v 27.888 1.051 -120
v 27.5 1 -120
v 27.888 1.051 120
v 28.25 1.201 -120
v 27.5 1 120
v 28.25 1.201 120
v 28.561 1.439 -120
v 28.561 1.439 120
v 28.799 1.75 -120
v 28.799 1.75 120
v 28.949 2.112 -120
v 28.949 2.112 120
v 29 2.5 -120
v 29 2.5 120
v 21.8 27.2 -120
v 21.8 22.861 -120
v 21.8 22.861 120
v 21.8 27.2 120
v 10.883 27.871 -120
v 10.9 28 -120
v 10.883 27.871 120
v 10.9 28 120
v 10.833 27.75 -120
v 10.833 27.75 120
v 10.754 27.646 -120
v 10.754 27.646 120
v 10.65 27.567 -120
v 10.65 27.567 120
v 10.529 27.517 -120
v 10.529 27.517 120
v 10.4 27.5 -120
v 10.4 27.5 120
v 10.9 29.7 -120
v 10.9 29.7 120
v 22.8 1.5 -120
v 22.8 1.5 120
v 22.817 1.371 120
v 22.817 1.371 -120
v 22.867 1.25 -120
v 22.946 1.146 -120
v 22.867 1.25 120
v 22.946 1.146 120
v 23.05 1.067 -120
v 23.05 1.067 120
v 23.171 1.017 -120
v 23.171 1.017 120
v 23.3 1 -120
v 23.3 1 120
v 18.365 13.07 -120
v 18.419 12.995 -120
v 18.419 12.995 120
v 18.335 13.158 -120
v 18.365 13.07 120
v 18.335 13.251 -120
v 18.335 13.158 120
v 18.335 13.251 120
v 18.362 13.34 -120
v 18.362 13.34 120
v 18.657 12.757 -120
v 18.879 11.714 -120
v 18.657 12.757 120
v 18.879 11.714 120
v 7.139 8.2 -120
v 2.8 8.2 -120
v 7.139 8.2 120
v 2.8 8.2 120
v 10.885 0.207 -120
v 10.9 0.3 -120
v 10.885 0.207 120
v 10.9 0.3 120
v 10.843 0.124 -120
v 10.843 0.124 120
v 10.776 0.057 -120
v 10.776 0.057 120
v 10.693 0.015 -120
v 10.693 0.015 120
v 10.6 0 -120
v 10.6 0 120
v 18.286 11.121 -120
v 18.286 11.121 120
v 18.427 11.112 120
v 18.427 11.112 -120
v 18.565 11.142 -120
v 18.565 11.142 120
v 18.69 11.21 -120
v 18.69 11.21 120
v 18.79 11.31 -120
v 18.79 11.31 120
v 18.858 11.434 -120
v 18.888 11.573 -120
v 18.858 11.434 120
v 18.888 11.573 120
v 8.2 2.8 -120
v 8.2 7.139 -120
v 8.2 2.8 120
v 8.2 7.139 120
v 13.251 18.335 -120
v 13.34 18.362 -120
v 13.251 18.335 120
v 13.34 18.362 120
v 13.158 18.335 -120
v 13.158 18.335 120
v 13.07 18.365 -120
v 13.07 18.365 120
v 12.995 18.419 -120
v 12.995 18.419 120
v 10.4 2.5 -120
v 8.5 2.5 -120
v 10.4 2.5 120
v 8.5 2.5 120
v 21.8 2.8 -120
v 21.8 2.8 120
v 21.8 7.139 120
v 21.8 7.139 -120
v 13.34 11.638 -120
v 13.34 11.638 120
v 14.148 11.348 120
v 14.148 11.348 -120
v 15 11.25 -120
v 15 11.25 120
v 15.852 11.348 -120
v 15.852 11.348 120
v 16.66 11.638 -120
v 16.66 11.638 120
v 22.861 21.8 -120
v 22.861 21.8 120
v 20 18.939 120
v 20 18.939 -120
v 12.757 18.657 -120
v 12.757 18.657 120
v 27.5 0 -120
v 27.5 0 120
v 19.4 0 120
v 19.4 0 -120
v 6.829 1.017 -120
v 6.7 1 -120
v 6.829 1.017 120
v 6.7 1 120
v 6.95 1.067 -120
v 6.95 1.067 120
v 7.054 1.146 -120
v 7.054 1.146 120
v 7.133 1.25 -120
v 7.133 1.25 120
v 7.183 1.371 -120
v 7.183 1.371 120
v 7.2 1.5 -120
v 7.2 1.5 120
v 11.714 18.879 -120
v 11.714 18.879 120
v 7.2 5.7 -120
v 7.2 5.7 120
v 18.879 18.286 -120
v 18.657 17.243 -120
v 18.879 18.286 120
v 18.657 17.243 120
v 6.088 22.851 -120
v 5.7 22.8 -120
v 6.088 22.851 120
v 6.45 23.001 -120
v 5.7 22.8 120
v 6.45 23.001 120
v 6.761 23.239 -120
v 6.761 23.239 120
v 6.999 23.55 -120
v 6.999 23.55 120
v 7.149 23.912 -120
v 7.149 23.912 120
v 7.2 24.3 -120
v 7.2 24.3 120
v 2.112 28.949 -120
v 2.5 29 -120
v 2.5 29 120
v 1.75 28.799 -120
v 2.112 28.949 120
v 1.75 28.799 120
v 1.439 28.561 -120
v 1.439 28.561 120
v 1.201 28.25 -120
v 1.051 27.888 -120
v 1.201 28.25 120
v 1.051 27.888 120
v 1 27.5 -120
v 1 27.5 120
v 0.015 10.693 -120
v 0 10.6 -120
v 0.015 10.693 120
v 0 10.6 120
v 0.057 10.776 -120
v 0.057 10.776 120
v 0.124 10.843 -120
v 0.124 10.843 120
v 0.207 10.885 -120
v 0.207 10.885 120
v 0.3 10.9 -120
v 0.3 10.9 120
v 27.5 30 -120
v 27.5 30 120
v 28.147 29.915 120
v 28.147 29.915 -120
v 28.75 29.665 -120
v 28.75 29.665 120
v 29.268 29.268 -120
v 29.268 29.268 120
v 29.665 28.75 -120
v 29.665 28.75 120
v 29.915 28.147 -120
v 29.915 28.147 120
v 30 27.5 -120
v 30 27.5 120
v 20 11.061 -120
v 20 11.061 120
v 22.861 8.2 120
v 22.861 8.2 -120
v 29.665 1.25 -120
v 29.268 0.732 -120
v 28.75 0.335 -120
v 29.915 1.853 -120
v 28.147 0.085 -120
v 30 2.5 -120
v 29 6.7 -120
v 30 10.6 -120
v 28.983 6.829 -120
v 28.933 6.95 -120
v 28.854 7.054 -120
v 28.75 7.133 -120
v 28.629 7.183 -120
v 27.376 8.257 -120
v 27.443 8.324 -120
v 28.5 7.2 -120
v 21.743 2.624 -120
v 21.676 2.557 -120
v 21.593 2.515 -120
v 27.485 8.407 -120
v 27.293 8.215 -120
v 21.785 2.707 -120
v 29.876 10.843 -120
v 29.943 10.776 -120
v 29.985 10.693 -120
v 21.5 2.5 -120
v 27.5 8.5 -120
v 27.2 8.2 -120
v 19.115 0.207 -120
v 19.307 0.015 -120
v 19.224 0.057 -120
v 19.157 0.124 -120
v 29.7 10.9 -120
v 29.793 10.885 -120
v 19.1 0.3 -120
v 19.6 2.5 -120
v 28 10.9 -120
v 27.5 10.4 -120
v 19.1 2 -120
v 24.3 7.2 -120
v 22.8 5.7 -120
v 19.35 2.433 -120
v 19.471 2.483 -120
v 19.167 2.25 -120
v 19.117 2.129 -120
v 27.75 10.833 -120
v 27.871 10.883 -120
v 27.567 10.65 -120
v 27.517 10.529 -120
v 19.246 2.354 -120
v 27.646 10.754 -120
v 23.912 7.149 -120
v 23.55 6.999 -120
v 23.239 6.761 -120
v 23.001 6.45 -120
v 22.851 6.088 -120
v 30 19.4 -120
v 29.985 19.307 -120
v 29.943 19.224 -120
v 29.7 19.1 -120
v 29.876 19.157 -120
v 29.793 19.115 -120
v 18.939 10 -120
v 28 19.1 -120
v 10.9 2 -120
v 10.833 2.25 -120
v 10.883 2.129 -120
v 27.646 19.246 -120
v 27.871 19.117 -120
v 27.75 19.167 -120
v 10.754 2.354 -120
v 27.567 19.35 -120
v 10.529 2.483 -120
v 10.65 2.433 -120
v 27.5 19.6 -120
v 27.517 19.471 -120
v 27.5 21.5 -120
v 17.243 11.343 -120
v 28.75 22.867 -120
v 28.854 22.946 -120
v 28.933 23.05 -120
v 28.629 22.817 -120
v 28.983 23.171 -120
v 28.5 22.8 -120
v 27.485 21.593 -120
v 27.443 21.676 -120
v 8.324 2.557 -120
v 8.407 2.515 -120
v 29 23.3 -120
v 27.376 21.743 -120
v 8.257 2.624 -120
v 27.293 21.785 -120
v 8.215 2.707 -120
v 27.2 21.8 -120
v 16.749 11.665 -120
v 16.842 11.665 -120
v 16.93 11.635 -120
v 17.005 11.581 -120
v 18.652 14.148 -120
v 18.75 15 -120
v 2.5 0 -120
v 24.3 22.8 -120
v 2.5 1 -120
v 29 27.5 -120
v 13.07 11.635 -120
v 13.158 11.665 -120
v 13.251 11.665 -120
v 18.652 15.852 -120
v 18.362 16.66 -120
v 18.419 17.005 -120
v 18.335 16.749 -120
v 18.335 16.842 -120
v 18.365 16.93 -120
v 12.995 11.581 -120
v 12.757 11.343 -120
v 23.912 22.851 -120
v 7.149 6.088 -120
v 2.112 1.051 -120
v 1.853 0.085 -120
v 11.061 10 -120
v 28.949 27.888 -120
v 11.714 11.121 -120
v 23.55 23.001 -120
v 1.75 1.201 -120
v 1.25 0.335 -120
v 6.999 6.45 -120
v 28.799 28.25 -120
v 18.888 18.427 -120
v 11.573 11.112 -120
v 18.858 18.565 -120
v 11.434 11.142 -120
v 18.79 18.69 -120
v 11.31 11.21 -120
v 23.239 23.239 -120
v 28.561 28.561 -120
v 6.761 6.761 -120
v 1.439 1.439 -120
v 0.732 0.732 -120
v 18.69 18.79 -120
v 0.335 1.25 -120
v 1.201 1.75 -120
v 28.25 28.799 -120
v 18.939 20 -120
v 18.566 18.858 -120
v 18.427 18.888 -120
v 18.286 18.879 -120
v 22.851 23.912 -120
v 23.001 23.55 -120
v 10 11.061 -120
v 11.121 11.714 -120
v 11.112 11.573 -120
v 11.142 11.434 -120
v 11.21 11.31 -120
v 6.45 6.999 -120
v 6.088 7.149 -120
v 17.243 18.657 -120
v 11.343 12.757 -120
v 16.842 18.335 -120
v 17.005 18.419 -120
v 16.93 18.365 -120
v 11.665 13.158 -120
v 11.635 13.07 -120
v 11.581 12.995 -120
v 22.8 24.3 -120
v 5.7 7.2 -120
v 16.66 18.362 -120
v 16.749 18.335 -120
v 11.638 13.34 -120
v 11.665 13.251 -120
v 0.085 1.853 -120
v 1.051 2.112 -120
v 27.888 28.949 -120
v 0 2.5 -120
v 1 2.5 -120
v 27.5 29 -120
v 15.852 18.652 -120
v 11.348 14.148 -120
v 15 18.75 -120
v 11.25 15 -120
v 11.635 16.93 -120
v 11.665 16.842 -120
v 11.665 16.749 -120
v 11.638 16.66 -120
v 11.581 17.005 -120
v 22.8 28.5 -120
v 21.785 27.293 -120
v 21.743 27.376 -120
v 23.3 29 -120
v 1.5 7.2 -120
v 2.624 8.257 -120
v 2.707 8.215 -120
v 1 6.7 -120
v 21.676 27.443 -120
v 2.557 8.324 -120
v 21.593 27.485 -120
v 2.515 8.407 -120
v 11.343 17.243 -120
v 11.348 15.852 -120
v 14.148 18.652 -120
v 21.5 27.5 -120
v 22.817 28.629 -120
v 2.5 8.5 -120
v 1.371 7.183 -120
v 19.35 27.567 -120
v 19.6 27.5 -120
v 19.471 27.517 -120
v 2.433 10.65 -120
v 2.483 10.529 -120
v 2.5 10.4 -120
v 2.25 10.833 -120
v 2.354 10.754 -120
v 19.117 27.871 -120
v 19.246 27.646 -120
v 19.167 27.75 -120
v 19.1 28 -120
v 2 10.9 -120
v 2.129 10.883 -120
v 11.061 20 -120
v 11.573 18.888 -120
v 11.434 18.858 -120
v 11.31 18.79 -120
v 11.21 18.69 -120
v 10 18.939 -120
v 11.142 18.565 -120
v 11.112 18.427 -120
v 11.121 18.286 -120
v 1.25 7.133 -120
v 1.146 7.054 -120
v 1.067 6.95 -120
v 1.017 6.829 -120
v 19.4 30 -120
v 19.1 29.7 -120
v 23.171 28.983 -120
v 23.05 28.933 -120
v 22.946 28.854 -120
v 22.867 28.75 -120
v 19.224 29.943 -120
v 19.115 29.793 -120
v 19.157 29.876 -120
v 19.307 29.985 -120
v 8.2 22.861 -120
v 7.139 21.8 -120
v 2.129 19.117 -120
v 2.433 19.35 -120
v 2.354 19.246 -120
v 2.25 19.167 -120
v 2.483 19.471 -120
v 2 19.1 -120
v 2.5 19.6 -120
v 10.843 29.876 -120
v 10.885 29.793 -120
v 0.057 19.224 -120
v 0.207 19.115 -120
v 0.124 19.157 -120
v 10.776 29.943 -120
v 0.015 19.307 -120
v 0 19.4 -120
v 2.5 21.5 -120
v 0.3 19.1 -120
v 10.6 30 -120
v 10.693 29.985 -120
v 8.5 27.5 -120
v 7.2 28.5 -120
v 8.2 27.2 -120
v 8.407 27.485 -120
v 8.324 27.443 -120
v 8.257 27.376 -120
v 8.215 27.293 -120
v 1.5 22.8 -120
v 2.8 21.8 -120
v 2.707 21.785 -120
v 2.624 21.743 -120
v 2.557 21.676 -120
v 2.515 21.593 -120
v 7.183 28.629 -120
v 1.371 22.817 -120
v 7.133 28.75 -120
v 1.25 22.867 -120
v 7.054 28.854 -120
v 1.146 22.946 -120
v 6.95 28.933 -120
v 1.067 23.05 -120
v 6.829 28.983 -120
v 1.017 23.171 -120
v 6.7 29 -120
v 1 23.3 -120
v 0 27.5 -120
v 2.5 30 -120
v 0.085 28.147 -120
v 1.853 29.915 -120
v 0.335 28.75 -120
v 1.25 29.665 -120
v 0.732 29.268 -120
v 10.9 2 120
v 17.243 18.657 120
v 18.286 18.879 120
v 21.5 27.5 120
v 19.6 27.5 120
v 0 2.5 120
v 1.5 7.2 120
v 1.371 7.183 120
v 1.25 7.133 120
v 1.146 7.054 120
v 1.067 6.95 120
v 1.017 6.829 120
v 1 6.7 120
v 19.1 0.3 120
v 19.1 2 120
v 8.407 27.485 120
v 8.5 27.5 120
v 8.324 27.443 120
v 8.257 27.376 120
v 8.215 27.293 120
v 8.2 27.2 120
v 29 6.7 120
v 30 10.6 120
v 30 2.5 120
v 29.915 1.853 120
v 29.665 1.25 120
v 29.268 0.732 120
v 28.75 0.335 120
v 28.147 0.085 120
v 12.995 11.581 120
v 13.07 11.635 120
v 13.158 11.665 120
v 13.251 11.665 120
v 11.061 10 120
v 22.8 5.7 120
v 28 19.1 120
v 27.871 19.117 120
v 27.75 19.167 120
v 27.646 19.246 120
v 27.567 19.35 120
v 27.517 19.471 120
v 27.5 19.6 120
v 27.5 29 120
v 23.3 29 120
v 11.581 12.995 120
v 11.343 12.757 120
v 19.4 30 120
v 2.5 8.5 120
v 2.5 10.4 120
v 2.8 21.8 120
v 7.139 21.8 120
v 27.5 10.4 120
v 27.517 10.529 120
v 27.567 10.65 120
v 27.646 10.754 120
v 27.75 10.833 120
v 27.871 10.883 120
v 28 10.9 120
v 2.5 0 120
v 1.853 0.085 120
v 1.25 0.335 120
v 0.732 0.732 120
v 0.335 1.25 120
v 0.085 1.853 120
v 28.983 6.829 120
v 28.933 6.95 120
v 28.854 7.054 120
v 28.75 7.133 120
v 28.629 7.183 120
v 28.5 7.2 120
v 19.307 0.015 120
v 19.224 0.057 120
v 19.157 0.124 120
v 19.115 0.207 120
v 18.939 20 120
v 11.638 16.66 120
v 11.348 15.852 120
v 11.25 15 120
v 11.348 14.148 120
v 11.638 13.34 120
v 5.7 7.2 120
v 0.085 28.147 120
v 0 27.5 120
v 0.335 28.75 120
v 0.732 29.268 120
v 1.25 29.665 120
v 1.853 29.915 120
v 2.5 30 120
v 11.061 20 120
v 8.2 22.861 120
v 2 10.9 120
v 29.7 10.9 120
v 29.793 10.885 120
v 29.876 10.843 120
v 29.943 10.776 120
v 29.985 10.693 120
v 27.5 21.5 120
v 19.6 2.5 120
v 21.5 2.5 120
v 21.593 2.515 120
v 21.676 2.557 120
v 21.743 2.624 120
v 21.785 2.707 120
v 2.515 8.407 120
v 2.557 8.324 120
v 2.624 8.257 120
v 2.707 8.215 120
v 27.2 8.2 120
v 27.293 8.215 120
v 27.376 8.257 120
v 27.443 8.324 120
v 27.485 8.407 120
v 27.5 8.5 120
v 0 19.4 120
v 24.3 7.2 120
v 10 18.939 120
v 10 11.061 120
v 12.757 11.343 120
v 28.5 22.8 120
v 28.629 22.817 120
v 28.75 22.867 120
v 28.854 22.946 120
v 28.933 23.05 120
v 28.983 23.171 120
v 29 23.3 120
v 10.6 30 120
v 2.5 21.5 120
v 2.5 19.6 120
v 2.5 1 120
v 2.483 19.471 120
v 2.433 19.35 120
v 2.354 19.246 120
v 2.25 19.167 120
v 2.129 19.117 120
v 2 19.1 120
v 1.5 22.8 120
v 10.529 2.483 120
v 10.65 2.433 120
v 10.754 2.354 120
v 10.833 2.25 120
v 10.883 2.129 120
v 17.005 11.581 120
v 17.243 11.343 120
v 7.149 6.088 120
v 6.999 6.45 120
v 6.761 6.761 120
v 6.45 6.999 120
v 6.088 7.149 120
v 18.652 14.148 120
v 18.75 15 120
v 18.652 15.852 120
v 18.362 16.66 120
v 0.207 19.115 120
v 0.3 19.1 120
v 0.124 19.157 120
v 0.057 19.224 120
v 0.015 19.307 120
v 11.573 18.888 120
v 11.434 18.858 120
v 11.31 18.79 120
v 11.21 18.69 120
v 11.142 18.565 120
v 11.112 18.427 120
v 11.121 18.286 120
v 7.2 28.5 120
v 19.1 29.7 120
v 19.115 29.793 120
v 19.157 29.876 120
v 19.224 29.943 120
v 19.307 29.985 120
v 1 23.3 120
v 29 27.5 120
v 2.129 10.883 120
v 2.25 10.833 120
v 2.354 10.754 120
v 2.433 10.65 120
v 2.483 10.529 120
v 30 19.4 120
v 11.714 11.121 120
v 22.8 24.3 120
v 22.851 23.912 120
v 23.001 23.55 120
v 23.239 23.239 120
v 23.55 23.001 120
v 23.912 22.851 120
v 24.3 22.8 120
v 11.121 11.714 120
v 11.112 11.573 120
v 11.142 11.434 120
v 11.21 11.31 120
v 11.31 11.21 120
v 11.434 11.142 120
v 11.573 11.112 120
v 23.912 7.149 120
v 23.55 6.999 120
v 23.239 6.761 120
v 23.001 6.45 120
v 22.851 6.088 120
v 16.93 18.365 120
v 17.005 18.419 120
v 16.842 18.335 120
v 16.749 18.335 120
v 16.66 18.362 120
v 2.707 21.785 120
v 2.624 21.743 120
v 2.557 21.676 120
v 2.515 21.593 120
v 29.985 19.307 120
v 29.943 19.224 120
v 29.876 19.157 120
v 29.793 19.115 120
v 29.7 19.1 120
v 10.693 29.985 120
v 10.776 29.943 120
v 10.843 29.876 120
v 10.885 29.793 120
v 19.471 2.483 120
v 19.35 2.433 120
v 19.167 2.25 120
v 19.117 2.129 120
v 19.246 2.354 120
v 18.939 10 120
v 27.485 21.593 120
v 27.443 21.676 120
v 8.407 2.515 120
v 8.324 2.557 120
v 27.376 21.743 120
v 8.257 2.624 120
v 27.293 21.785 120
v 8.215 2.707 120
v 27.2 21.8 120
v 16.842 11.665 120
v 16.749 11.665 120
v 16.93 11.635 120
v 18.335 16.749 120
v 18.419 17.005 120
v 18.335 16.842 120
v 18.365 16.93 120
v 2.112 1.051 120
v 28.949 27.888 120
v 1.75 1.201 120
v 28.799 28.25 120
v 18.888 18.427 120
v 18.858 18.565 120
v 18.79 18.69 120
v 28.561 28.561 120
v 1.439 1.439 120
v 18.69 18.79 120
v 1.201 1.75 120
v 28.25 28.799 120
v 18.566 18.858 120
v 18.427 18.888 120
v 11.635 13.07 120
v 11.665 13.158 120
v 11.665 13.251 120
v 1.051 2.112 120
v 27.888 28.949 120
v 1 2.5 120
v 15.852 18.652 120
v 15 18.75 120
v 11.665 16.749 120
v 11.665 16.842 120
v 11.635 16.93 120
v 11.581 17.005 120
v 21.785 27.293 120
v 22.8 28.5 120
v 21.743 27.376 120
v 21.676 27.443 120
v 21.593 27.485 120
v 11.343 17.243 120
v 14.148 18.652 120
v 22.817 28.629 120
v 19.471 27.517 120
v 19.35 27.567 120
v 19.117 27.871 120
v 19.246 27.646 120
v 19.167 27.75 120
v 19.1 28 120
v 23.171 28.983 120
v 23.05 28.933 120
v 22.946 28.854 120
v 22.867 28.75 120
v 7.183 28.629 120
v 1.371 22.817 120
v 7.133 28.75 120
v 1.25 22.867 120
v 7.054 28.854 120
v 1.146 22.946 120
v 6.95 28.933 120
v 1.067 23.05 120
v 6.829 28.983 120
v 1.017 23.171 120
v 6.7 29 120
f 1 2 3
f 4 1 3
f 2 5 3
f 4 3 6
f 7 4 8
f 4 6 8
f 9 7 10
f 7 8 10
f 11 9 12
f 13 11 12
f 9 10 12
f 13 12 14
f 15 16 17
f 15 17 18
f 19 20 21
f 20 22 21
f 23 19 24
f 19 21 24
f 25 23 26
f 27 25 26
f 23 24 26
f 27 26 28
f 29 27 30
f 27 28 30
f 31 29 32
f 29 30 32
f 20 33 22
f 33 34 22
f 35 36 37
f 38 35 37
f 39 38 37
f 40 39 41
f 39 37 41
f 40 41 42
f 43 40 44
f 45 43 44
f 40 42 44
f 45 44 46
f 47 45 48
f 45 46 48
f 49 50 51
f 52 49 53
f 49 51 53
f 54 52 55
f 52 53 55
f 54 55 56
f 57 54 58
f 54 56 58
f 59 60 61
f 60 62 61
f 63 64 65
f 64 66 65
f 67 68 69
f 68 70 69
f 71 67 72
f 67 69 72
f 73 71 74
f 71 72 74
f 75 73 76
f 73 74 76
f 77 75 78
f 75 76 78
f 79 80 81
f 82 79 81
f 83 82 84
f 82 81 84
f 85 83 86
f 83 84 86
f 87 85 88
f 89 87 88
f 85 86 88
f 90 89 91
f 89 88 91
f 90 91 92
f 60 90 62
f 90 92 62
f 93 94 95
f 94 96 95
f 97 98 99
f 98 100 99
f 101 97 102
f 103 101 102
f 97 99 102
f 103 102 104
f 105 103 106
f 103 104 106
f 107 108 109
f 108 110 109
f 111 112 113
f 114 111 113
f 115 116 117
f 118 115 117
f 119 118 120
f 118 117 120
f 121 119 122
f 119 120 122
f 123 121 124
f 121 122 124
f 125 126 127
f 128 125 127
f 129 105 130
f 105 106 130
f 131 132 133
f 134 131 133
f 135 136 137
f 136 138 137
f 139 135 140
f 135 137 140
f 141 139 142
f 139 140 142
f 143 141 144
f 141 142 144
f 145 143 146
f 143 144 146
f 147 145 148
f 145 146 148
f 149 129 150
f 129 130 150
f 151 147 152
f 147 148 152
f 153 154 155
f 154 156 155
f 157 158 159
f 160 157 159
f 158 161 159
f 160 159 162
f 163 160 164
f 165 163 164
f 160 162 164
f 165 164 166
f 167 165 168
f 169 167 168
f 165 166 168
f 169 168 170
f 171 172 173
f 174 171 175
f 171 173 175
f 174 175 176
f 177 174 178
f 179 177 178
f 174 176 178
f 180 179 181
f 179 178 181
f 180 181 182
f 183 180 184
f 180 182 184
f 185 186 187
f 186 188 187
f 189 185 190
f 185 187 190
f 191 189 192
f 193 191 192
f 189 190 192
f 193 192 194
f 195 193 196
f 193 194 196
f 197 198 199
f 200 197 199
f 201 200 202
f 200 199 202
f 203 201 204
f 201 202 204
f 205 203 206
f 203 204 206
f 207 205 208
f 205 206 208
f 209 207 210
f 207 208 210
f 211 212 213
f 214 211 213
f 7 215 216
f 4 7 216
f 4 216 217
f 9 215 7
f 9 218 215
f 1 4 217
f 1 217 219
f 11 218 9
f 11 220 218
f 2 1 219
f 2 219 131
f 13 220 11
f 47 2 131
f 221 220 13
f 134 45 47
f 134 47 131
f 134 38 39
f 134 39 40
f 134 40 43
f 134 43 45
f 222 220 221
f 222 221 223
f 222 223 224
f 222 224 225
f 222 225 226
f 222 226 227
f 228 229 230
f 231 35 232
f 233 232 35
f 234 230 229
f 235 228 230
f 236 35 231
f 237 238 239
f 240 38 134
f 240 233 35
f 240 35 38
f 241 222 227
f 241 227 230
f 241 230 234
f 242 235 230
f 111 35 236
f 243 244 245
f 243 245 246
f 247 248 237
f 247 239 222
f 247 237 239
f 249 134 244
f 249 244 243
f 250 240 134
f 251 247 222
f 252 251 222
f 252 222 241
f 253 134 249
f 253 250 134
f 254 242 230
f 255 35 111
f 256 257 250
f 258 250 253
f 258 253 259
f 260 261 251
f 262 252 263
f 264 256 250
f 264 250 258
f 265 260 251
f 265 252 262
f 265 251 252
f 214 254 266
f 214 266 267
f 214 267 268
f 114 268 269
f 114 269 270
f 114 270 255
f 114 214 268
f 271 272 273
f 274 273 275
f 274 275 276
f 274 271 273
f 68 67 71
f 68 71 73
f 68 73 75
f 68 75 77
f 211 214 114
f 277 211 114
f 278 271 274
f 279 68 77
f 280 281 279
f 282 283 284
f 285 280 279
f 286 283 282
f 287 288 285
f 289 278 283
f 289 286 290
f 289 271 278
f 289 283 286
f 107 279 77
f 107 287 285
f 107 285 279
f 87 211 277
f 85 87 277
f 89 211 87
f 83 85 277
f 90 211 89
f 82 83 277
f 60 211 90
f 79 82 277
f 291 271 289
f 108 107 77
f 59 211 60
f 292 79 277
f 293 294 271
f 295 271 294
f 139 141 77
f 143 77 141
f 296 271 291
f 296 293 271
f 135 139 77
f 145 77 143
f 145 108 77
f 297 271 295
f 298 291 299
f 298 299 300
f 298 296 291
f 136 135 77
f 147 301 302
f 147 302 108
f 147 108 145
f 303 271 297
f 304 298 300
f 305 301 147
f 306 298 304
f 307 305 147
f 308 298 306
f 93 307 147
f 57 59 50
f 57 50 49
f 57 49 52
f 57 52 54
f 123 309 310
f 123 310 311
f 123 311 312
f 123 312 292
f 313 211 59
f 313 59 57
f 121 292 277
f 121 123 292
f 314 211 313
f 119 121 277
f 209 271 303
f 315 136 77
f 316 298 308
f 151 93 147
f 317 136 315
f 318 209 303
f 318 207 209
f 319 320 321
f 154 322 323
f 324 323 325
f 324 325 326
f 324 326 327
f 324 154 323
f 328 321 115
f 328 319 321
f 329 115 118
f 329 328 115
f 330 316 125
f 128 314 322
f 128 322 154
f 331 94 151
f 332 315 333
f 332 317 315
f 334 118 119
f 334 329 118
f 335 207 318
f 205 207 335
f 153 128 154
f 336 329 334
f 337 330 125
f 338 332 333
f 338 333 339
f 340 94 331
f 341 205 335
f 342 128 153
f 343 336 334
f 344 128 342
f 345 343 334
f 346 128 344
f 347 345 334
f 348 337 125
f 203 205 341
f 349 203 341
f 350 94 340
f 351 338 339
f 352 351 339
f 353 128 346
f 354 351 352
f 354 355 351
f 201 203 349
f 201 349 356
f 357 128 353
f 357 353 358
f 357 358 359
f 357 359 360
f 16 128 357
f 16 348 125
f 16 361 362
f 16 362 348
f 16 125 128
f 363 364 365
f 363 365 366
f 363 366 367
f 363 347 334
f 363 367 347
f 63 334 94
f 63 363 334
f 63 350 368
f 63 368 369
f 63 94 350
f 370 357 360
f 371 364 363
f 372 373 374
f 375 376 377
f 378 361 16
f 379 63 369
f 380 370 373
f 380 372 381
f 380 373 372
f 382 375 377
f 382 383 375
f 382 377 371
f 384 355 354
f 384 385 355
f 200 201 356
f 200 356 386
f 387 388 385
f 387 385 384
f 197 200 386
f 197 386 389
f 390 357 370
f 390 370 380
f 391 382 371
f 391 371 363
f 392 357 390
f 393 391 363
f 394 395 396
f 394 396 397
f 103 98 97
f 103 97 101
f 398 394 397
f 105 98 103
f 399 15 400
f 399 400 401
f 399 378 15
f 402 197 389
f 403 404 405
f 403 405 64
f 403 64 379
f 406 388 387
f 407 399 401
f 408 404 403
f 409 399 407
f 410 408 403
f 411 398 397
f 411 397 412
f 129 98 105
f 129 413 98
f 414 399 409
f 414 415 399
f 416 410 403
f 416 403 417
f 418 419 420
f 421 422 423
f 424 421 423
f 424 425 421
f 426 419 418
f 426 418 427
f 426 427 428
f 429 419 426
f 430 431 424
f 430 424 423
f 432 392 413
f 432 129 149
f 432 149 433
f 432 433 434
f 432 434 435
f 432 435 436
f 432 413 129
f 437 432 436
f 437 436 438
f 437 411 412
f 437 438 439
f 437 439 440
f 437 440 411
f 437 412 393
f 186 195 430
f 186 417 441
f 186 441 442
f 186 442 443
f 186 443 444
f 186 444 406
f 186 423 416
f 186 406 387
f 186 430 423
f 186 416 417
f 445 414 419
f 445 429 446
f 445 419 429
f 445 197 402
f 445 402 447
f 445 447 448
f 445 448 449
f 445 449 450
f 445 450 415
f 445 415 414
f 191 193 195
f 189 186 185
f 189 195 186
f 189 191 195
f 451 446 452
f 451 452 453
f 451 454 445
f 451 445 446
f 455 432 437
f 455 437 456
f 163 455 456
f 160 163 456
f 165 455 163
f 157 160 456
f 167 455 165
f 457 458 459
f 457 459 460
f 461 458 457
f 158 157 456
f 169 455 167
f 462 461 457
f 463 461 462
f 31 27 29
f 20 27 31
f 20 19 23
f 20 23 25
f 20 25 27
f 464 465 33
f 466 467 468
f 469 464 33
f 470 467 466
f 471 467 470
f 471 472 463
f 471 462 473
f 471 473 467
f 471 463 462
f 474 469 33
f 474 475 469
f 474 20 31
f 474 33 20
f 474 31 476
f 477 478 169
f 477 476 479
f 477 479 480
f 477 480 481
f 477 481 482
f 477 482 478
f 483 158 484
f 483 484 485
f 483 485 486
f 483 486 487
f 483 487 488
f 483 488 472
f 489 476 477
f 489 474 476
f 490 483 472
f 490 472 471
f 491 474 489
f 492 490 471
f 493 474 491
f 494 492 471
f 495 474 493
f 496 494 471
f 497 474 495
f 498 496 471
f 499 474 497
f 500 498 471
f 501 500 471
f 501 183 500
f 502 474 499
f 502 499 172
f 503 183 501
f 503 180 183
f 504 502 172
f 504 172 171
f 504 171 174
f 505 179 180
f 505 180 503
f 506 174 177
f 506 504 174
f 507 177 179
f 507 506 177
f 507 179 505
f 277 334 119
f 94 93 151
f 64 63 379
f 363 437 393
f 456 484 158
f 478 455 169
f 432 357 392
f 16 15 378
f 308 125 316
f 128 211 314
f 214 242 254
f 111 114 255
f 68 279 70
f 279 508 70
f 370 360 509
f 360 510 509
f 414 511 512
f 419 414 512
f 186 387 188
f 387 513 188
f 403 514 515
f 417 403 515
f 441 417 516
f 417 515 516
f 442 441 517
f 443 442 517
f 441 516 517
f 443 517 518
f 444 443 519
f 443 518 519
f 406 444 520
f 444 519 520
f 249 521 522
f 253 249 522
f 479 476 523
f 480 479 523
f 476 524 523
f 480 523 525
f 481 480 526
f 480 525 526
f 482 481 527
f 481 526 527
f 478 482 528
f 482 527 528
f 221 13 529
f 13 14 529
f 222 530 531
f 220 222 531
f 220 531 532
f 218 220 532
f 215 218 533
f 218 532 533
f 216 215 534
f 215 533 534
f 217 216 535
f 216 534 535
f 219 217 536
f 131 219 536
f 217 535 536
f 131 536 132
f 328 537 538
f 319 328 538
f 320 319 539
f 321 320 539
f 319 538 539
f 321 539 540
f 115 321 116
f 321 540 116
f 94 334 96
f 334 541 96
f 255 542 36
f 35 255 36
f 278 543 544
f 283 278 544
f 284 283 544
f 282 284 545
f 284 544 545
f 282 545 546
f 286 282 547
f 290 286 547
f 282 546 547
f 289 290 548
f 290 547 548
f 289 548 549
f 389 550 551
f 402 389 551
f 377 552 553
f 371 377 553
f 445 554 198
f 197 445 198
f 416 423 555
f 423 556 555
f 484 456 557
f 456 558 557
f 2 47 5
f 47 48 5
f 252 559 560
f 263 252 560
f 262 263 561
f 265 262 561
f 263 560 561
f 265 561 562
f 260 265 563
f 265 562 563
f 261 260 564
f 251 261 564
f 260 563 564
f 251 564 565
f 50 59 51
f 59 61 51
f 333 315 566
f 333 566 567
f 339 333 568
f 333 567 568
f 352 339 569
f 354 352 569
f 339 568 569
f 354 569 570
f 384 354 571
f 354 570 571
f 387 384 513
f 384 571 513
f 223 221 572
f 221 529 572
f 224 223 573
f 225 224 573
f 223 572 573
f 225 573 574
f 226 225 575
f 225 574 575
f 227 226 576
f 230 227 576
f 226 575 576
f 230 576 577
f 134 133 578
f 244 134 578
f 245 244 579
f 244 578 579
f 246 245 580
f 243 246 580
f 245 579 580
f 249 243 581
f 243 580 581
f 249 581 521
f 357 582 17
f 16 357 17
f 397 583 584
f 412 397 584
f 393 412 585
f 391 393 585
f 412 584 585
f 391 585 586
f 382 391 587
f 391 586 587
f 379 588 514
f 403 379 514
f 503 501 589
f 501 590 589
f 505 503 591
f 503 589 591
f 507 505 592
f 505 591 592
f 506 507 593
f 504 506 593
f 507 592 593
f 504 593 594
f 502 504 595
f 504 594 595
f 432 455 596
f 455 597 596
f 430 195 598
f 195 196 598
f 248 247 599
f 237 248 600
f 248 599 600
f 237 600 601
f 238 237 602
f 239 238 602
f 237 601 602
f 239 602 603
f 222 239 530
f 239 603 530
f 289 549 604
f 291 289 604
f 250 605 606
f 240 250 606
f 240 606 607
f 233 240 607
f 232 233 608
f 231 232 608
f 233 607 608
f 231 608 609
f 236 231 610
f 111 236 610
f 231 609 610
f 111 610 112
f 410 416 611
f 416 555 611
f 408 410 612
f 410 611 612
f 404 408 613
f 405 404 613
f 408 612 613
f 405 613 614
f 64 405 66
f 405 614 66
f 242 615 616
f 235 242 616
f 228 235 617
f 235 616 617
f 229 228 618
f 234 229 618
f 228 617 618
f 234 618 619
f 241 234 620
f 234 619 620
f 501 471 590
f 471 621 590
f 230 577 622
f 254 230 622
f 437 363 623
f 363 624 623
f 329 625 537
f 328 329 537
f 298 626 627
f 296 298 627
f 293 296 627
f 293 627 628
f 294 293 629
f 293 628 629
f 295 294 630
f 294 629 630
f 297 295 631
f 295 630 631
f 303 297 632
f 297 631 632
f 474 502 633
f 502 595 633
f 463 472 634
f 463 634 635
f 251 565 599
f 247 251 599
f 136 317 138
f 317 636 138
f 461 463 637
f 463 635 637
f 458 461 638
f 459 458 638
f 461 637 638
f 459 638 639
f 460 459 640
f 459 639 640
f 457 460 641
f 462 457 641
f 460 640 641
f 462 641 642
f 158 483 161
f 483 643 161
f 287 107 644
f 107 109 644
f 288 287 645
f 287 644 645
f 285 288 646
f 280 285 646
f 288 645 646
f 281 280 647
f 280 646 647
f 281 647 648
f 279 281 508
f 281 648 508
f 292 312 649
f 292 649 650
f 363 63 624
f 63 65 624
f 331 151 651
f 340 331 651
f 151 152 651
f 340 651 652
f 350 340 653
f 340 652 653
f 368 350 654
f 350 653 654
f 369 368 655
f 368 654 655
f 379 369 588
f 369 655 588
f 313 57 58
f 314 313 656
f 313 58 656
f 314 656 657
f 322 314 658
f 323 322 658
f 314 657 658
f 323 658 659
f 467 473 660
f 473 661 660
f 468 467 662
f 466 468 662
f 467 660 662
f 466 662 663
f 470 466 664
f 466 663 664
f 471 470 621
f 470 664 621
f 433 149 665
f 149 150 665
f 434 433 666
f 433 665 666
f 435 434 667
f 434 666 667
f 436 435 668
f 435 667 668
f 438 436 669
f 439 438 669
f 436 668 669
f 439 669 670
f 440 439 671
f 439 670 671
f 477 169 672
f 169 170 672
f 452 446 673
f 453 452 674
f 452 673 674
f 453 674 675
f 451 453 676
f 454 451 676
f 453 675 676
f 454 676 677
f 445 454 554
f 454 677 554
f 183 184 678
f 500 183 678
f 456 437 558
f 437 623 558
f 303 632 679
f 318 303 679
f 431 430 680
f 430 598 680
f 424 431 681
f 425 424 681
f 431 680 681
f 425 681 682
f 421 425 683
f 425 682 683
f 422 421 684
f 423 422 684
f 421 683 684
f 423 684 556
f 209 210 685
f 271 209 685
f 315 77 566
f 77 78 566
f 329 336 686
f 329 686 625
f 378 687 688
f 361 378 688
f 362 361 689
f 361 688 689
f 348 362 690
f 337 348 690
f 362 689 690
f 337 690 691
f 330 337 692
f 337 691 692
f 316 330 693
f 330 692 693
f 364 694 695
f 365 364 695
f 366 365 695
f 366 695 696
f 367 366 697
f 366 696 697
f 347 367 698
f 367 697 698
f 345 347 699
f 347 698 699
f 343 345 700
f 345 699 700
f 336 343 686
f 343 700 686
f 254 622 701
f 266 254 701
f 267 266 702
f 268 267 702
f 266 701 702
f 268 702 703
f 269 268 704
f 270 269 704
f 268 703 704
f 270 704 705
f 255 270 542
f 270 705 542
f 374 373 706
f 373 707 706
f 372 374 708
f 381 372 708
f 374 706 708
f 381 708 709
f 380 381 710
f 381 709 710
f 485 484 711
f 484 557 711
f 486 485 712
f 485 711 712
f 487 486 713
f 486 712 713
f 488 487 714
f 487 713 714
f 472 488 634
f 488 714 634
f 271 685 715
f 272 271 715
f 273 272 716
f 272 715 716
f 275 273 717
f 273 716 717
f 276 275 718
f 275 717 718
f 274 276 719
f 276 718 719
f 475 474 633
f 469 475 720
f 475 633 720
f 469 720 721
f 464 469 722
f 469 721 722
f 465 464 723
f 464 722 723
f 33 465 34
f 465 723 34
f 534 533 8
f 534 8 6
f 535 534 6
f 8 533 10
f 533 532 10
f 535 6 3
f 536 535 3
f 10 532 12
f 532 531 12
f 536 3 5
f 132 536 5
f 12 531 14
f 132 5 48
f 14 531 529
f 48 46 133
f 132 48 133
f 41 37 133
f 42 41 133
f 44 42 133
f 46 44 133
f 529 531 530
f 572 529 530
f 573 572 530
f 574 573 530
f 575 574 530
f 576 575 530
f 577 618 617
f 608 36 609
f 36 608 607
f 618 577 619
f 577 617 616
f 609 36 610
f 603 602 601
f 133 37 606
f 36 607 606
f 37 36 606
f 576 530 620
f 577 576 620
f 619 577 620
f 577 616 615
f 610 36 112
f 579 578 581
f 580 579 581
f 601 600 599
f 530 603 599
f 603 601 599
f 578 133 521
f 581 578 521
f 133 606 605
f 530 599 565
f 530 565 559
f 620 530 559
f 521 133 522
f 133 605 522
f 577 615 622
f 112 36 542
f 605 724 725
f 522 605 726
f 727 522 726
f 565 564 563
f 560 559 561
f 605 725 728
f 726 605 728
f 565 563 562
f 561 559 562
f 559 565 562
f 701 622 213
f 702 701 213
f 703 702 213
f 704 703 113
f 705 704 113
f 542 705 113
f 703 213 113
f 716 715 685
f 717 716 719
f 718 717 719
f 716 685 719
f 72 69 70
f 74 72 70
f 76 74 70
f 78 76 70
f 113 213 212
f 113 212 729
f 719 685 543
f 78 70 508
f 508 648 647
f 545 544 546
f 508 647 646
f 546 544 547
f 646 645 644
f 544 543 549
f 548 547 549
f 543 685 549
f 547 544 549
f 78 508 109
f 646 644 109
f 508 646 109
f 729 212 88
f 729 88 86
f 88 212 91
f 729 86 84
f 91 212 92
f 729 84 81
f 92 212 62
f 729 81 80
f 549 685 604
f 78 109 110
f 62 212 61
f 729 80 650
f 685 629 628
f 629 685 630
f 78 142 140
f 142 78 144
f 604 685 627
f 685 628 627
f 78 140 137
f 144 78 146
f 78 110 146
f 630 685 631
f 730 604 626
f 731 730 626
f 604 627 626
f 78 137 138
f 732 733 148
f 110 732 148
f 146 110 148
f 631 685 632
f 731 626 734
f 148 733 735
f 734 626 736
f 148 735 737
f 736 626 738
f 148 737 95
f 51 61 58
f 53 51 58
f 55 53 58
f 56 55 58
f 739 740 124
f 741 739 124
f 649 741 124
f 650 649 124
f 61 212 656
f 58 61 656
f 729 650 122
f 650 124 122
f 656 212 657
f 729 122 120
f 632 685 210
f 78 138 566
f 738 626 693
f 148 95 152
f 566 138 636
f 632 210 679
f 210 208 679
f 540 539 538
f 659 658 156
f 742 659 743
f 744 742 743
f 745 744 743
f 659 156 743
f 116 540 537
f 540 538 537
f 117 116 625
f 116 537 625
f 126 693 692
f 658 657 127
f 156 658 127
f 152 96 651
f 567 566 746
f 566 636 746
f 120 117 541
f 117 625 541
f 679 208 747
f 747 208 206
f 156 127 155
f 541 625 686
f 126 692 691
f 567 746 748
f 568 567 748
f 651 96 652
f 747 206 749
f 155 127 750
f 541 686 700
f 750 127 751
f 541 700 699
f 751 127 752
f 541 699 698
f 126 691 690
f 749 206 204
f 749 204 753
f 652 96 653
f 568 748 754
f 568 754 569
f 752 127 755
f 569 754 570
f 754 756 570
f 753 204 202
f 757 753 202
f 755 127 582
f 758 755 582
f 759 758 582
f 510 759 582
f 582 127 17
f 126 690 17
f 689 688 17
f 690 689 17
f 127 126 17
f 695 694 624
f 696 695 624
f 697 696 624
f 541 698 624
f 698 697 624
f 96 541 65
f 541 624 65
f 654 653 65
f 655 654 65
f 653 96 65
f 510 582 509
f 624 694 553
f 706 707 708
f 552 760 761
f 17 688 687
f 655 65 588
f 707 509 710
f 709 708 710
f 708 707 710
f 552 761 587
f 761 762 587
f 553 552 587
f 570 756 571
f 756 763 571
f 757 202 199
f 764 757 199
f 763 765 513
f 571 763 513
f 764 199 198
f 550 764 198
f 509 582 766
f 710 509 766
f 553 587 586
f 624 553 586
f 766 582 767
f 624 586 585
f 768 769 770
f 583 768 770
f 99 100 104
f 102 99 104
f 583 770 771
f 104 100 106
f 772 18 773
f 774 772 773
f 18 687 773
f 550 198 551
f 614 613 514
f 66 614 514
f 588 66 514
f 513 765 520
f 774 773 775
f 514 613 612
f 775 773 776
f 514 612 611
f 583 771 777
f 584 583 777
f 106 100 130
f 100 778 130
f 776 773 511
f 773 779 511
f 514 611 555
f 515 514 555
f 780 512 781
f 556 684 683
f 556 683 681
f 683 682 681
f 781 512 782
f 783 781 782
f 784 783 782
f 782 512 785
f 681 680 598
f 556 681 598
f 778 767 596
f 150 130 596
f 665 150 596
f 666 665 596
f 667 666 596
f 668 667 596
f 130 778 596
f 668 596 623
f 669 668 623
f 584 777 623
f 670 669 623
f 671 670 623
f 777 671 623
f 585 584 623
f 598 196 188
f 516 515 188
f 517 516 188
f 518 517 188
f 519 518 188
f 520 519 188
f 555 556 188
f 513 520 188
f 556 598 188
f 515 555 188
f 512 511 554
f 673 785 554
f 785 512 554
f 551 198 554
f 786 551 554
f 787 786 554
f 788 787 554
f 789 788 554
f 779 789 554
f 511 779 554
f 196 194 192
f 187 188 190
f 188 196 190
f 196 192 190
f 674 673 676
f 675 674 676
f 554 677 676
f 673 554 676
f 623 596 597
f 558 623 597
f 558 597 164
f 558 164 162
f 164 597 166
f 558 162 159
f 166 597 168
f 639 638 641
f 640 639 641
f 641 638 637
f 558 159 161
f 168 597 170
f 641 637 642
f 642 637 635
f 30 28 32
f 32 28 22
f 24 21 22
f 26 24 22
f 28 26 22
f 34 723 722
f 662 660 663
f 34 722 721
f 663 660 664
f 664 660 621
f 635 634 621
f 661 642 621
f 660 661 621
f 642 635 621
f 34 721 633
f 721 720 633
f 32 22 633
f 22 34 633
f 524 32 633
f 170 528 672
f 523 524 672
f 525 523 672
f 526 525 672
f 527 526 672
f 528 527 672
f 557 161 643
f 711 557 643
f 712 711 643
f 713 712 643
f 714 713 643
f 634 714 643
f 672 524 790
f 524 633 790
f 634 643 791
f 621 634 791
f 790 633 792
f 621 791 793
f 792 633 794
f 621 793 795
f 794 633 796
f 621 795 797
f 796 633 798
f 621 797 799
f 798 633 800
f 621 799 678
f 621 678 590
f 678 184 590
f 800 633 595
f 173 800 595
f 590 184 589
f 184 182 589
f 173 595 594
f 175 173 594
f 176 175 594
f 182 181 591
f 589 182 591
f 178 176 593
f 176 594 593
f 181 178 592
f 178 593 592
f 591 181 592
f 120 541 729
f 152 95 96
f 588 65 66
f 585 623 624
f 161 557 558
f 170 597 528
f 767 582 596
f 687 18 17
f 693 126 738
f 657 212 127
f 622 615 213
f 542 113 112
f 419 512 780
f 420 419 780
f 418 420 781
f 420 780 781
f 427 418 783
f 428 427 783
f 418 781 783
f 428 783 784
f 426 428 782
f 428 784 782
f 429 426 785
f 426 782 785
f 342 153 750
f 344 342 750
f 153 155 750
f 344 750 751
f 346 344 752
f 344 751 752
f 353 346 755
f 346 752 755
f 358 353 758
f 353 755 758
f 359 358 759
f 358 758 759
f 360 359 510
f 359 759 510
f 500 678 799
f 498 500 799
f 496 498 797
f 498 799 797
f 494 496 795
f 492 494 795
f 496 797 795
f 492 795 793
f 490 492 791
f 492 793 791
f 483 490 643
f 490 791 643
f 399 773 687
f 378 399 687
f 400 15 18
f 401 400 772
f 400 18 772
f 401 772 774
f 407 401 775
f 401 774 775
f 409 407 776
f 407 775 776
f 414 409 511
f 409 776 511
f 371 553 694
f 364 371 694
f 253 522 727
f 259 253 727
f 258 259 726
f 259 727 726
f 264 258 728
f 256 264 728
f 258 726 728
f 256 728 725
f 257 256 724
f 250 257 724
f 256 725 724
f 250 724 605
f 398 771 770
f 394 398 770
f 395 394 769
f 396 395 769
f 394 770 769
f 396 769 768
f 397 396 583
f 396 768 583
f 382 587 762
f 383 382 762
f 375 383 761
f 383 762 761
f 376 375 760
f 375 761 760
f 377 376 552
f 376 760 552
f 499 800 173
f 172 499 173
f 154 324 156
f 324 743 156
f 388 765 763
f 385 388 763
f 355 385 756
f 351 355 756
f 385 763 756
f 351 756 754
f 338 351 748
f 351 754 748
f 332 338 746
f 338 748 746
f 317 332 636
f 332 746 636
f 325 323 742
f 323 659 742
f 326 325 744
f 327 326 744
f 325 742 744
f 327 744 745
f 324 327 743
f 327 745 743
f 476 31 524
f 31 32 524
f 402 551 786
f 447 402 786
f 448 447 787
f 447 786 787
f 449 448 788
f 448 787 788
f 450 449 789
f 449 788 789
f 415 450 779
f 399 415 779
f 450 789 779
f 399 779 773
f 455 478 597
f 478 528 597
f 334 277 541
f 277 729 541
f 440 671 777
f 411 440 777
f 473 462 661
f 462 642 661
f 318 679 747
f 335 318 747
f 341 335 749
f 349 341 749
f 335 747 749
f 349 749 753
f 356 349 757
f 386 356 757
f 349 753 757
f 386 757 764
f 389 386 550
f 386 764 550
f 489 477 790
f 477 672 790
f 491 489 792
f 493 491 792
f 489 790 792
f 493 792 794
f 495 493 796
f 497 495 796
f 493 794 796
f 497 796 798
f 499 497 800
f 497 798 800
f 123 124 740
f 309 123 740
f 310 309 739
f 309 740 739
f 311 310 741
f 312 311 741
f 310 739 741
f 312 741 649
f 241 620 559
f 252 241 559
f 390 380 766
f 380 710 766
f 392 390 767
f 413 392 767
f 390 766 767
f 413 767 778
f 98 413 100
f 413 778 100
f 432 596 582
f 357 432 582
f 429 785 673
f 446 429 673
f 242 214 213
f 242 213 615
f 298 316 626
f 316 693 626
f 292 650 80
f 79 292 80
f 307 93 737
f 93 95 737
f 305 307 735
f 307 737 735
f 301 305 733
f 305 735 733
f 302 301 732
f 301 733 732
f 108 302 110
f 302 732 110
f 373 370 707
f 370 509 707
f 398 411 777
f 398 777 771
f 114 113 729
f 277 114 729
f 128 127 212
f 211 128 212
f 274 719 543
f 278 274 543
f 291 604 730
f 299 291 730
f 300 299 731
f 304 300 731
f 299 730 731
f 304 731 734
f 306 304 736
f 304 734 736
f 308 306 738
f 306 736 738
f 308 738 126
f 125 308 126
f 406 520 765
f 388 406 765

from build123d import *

# Parameters (mm, degrees)
BOSS_EXTRUDE1_DEPTH = 120


with BuildPart() as part:
    # Sketch1 → Boss-Extrude1 (new body, symmetric)
    with BuildSketch(Plane.XY):
        with BuildLine():
            Line((21.799994, 7.139358412), (18.939339529, 9.999998412))
            Line((18.939339529, 9.999998412), (11.060658529, 9.999998412))
            Line((11.060658529, 9.999998412), (8.200003529, 7.139342412))
            Line((8.200003529, 7.139342412), (8.200003529, 2.800001412))
            ThreePointArc((8.200003529, 2.800001412), (8.287868495, 2.58786762), (8.500000529, 2.499998412))
            Line((8.500000529, 2.499998412), (10.400000529, 2.499998412))
            ThreePointArc((10.400000529, 2.499998412), (10.75355392, 2.353551802), (10.900000529, 1.999998412))
            Line((10.900000529, 1.999998412), (10.900000529, 0.299995529))
            ThreePointArc((10.900000529, 0.299995529), (10.812133796, 0.08786744), (10.600006, 0))
            Line((10.600006, 0), (2.5, 0))
            ThreePointArc((2.5, 0), (0.732233047, 0.732233047), (0, 2.5))
            Line((0, 2.5), (0, 10.600006))
            ThreePointArc((0, 10.600006), (0.087869562, 10.812137388), (0.300003, 10.900002))
            Line((0.300003, 10.900002), (2, 10.900002))
            ThreePointArc((2, 10.900002), (2.353553391, 10.753555391), (2.5, 10.400002))
            Line((2.5, 10.400002), (2.5, 8.500002))
            ThreePointArc((2.5, 8.500002), (2.587869099, 8.287870075), (2.80000269, 8.200005))
            Line((2.80000269, 8.200005), (7.139344, 8.200005))
            Line((7.139344, 8.200005), (10, 11.06066))
            Line((10, 11.06066), (10, 18.939341))
            Line((10, 18.939341), (7.139344, 21.799985148))
            Line((7.139344, 21.799985148), (2.800003, 21.799985148))
            ThreePointArc((2.800003, 21.799985148), (2.587872691, 21.712123666), (2.5, 21.499998))
            Line((2.5, 21.499998), (2.5, 19.599988398))
            ThreePointArc((2.5, 19.599988398), (2.353553317, 19.246434831), (1.99999975, 19.099988148))
            Line((1.99999975, 19.099988148), (0.299996735, 19.099988148))
            ThreePointArc((0.299996735, 19.099988148), (0.0878677, 19.187854622), (0, 19.399983148))
            Line((0, 19.399983148), (0, 27.499989148))
            ThreePointArc((0, 27.499989148), (0.732232787, 29.267756841), (2.500000265, 29.999990148))
            Line((2.500000265, 29.999990148), (10.6000062, 29.999990148))
            ThreePointArc((10.6000062, 29.999990148), (10.812133482, 29.912123021), (10.900000529, 29.699995706))
            Line((10.900000529, 29.699995706), (10.900000529, 27.999998706))
            ThreePointArc((10.900000529, 27.999998706), (10.753556384, 27.64644081), (10.400000529, 27.499991736))
            Line((10.400000529, 27.499991736), (8.499998529, 27.499991736))
            ThreePointArc((8.499998529, 27.499991736), (8.287867897, 27.41212193), (8.200003529, 27.199989046))
            Line((8.200003529, 27.199989046), (8.200003529, 22.860646736))
            Line((8.200003529, 22.860646736), (11.060659, 19.999991736))
            Line((11.060659, 19.999991736), (18.93934, 19.999991736))
            Line((18.93934, 19.999991736), (21.799994, 22.860646736))
            Line((21.799994, 22.860646736), (21.799994, 27.199988736))
            ThreePointArc((21.799994, 27.199988736), (21.712128868, 27.412122694), (21.499996529, 27.499991736))
            Line((21.499996529, 27.499991736), (19.599998, 27.499991736))
            ThreePointArc((19.599998, 27.499991736), (19.246444609, 27.646438346), (19.099998, 27.999991736))
            Line((19.099998, 27.999991736), (19.099998, 29.700007823))
            ThreePointArc((19.099998, 29.700007823), (19.187864526, 29.912137383), (19.3999935, 30.000005323))
            Line((19.3999935, 30.000005323), (27.4999995, 30.000005323))
            ThreePointArc((27.4999995, 30.000005323), (29.267773609, 29.267772326), (30.000009773, 27.499999529))
            Line((30.000009773, 27.499999529), (30.000009773, 19.399993594))
            ThreePointArc((30.000009773, 19.399993594), (29.912139919, 19.187852468), (29.6999965, 19.099988148))
            Line((29.6999965, 19.099988148), (27.9999995, 19.099988148))
            ThreePointArc((27.9999995, 19.099988148), (27.64645275, 19.246438389), (27.500009772, 19.599988147))
            Line((27.500009772, 19.599988147), (27.500009772, 21.499990147))
            ThreePointArc((27.500009772, 21.499990147), (27.412139967, 21.712120779), (27.200007083, 21.799985148))
            Line((27.200007083, 21.799985148), (22.860664773, 21.799985148))
            Line((22.860664773, 21.799985148), (20.000009773, 18.939341))
            Line((20.000009773, 18.939341), (20.000009773, 11.06066))
            Line((20.000009773, 11.06066), (22.8606545, 8.200005))
            Line((22.8606545, 8.200005), (27.1999965, 8.200005))
            ThreePointArc((27.1999965, 8.200005), (27.412129602, 8.287869277), (27.499999499, 8.500000052))
            Line((27.499999499, 8.500000052), (27.499999499, 10.400002001))
            ThreePointArc((27.499999499, 10.400002001), (27.646446109, 10.753555391), (27.9999995, 10.900002))
            Line((27.9999995, 10.900002), (29.7000025, 10.900002))
            ThreePointArc((29.7000025, 10.900002), (29.912138814, 10.812138492), (30.000009773, 10.600005265))
            Line((30.000009773, 10.600005265), (30.000009773, 2.499999265))
            ThreePointArc((30.000009773, 2.499999265), (29.267773942, 0.732224081), (27.500000177, -1.5175e-05))
            Line((27.500000177, -1.5175e-05), (19.399994245, -1.5175e-05))
            ThreePointArc((19.399994245, -1.5175e-05), (19.187855627, 0.08786137), (19.099998, 0.300007824))
            Line((19.099998, 0.300007824), (19.099998, 2.000004824))
            ThreePointArc((19.099998, 2.000004824), (19.246446356, 2.353553549), (19.599996529, 2.499998412))
            Line((19.599996529, 2.499998412), (21.499998529, 2.499998412))
            ThreePointArc((21.499998529, 2.499998412), (21.712135123, 2.587873708), (21.799994, 2.800017102))
            Line((21.799994, 2.800017102), (21.799994, 7.139358412))
        make_face()
        with BuildLine():
            Line((18.878868942, 11.714100014), (18.657285002, 12.75690673))
            Line((18.657285002, 12.75690673), (18.419345869, 12.994846743))
            ThreePointArc((18.419345869, 12.994846743), (18.335473622, 13.158180995), (18.362480424, 13.339793948))
            ThreePointArc((18.362480424, 13.339793948), (18.750006156, 14.99998656), (18.362487962, 16.660180933))
            ThreePointArc((18.362487962, 16.660180933), (18.335481889, 16.841794157), (18.419354758, 17.005128271))
            Line((18.419354758, 17.005128271), (18.657294593, 17.243067582))
            Line((18.657294593, 17.243067582), (18.878893628, 18.28587109))
            ThreePointArc((18.878893628, 18.28587109), (18.743367928, 18.743355263), (18.285883756, 18.878880962))
            Line((18.285883756, 18.878880962), (17.243080247, 18.657281928))
            Line((17.243080247, 18.657281928), (17.005140412, 18.419342617))
            ThreePointArc((17.005140412, 18.419342617), (16.84180664, 18.335470316), (16.660194009, 18.362476539))
            ThreePointArc((16.660194009, 18.362476539), (15.00000526, 18.749996344), (13.339816433, 18.362476869))
            ThreePointArc((13.339816433, 18.362476869), (13.158203164, 18.335470716), (12.994869031, 18.419343671))
            Line((12.994869031, 18.419343671), (12.756929898, 18.657283684))
            Line((12.756929898, 18.657283684), (11.714126233, 18.878881984))
            ThreePointArc((11.714126233, 18.878881984), (11.256641967, 18.743355772), (11.121116891, 18.28587117))
            Line((11.121116891, 18.28587117), (11.342717777, 17.243068055))
            Line((11.342717777, 17.243068055), (11.580656587, 17.00512772))
            ThreePointArc((11.580656587, 17.00512772), (11.664528478, 16.841794182), (11.637522309, 16.660181943))
            ThreePointArc((11.637522309, 16.660181943), (11.250003617, 14.999998075), (11.637519652, 13.339813587))
            ThreePointArc((11.637519652, 13.339813587), (11.664525497, 13.15820068), (11.580652734, 12.994866901))
            Line((11.580652734, 12.994866901), (11.342712898, 12.75692759))
            Line((11.342712898, 12.75692759), (11.12111194, 11.71412449))
            ThreePointArc((11.12111194, 11.71412449), (11.256636795, 11.256640068), (11.714120718, 11.121113524))
            Line((11.714120718, 11.121113524), (12.756924635, 11.342710635))
            Line((12.756924635, 11.342710635), (12.99486447, 11.580649946))
            ThreePointArc((12.99486447, 11.580649946), (13.158198441, 11.66452228), (13.339811235, 11.637515845))
            ThreePointArc((13.339811235, 11.637515845), (14.999988879, 11.249993804), (16.660169832, 11.637501672))
            ThreePointArc((16.660169832, 11.637501672), (16.841782614, 11.664506717), (17.005115943, 11.580633605))
            Line((17.005115943, 11.580633605), (17.243054753, 11.34269327))
            Line((17.243054753, 11.34269327), (18.285858839, 11.12109695))
            ThreePointArc((18.285858839, 11.12109695), (18.743339639, 11.256620822), (18.878868942, 11.714100014))
        make_face(mode=Mode.SUBTRACT)
        with BuildLine():
            Line((23.299995, 1), (27.5, 1))
            ThreePointArc((27.5, 1), (28.56065669, 1.439341852), (28.999994597, 2.500000176))
            Line((28.999994597, 2.500000176), (28.999994597, 6.700005176))
            ThreePointArc((28.999994597, 6.700005176), (28.853547926, 7.053558453), (28.499994597, 7.200005))
            Line((28.499994597, 7.200005), (24.299995, 7.200005))
            ThreePointArc((24.299995, 7.200005), (23.239334828, 6.760665172), (22.799995, 5.700005))
            Line((22.799995, 5.700005), (22.799995, 1.5))
            ThreePointArc((22.799995, 1.5), (22.946441609, 1.146446609), (23.299995, 1))
        make_face(mode=Mode.SUBTRACT)
        with BuildLine():
            Line((2.5, 1), (6.700005, 1))
            ThreePointArc((6.700005, 1), (7.05355839, 1.146446609), (7.200005, 1.5))
            Line((7.200005, 1.5), (7.200005, 5.700005))
            ThreePointArc((7.200005, 5.700005), (6.760665172, 6.760665172), (5.700005, 7.200005))
            Line((5.700005, 7.200005), (1.5, 7.200005))
            ThreePointArc((1.5, 7.200005), (1.146446609, 7.053558391), (1, 6.700005))
            Line((1, 6.700005), (1, 2.5))
            ThreePointArc((1, 2.5), (1.439339828, 1.439339828), (2.5, 1))
        make_face(mode=Mode.SUBTRACT)
        with BuildLine():
            Line((1.5, 22.799985148), (5.700005, 22.799985148))
            ThreePointArc((5.700005, 22.799985148), (6.760665172, 23.239324976), (7.200005, 24.299985148))
            Line((7.200005, 24.299985148), (7.200005, 28.499990148))
            ThreePointArc((7.200005, 28.499990148), (7.053558391, 28.853543539), (6.700005, 28.999990148))
            Line((6.700005, 28.999990148), (2.5, 28.999990148))
            ThreePointArc((2.5, 28.999990148), (1.439339828, 28.56065032), (1, 27.499990148))
            Line((1, 27.499990148), (1, 23.299985148))
            ThreePointArc((1, 23.299985148), (1.146446609, 22.946431757), (1.5, 22.799985148))
        make_face(mode=Mode.SUBTRACT)
        with BuildLine():
            Line((24.299995, 22.799985148), (28.499994597, 22.799985148))
            ThreePointArc((28.499994597, 22.799985148), (28.853551502, 22.946435272), (28.999994597, 23.299995088))
            Line((28.999994597, 23.299995088), (28.999994597, 27.500000088))
            ThreePointArc((28.999994597, 27.500000088), (28.560656076, 28.560654835), (27.5, 28.999990148))
            Line((27.5, 28.999990148), (23.299995, 28.999990148))
            ThreePointArc((23.299995, 28.999990148), (22.94644161, 28.853543539), (22.799995, 28.499990148))
            Line((22.799995, 28.499990148), (22.799995, 24.299985148))
            ThreePointArc((22.799995, 24.299985148), (23.239334828, 23.239324976), (24.299995, 22.799985148))
        make_face(mode=Mode.SUBTRACT)
    extrude(amount=BOSS_EXTRUDE1_DEPTH, both=True)


solid = part.part
